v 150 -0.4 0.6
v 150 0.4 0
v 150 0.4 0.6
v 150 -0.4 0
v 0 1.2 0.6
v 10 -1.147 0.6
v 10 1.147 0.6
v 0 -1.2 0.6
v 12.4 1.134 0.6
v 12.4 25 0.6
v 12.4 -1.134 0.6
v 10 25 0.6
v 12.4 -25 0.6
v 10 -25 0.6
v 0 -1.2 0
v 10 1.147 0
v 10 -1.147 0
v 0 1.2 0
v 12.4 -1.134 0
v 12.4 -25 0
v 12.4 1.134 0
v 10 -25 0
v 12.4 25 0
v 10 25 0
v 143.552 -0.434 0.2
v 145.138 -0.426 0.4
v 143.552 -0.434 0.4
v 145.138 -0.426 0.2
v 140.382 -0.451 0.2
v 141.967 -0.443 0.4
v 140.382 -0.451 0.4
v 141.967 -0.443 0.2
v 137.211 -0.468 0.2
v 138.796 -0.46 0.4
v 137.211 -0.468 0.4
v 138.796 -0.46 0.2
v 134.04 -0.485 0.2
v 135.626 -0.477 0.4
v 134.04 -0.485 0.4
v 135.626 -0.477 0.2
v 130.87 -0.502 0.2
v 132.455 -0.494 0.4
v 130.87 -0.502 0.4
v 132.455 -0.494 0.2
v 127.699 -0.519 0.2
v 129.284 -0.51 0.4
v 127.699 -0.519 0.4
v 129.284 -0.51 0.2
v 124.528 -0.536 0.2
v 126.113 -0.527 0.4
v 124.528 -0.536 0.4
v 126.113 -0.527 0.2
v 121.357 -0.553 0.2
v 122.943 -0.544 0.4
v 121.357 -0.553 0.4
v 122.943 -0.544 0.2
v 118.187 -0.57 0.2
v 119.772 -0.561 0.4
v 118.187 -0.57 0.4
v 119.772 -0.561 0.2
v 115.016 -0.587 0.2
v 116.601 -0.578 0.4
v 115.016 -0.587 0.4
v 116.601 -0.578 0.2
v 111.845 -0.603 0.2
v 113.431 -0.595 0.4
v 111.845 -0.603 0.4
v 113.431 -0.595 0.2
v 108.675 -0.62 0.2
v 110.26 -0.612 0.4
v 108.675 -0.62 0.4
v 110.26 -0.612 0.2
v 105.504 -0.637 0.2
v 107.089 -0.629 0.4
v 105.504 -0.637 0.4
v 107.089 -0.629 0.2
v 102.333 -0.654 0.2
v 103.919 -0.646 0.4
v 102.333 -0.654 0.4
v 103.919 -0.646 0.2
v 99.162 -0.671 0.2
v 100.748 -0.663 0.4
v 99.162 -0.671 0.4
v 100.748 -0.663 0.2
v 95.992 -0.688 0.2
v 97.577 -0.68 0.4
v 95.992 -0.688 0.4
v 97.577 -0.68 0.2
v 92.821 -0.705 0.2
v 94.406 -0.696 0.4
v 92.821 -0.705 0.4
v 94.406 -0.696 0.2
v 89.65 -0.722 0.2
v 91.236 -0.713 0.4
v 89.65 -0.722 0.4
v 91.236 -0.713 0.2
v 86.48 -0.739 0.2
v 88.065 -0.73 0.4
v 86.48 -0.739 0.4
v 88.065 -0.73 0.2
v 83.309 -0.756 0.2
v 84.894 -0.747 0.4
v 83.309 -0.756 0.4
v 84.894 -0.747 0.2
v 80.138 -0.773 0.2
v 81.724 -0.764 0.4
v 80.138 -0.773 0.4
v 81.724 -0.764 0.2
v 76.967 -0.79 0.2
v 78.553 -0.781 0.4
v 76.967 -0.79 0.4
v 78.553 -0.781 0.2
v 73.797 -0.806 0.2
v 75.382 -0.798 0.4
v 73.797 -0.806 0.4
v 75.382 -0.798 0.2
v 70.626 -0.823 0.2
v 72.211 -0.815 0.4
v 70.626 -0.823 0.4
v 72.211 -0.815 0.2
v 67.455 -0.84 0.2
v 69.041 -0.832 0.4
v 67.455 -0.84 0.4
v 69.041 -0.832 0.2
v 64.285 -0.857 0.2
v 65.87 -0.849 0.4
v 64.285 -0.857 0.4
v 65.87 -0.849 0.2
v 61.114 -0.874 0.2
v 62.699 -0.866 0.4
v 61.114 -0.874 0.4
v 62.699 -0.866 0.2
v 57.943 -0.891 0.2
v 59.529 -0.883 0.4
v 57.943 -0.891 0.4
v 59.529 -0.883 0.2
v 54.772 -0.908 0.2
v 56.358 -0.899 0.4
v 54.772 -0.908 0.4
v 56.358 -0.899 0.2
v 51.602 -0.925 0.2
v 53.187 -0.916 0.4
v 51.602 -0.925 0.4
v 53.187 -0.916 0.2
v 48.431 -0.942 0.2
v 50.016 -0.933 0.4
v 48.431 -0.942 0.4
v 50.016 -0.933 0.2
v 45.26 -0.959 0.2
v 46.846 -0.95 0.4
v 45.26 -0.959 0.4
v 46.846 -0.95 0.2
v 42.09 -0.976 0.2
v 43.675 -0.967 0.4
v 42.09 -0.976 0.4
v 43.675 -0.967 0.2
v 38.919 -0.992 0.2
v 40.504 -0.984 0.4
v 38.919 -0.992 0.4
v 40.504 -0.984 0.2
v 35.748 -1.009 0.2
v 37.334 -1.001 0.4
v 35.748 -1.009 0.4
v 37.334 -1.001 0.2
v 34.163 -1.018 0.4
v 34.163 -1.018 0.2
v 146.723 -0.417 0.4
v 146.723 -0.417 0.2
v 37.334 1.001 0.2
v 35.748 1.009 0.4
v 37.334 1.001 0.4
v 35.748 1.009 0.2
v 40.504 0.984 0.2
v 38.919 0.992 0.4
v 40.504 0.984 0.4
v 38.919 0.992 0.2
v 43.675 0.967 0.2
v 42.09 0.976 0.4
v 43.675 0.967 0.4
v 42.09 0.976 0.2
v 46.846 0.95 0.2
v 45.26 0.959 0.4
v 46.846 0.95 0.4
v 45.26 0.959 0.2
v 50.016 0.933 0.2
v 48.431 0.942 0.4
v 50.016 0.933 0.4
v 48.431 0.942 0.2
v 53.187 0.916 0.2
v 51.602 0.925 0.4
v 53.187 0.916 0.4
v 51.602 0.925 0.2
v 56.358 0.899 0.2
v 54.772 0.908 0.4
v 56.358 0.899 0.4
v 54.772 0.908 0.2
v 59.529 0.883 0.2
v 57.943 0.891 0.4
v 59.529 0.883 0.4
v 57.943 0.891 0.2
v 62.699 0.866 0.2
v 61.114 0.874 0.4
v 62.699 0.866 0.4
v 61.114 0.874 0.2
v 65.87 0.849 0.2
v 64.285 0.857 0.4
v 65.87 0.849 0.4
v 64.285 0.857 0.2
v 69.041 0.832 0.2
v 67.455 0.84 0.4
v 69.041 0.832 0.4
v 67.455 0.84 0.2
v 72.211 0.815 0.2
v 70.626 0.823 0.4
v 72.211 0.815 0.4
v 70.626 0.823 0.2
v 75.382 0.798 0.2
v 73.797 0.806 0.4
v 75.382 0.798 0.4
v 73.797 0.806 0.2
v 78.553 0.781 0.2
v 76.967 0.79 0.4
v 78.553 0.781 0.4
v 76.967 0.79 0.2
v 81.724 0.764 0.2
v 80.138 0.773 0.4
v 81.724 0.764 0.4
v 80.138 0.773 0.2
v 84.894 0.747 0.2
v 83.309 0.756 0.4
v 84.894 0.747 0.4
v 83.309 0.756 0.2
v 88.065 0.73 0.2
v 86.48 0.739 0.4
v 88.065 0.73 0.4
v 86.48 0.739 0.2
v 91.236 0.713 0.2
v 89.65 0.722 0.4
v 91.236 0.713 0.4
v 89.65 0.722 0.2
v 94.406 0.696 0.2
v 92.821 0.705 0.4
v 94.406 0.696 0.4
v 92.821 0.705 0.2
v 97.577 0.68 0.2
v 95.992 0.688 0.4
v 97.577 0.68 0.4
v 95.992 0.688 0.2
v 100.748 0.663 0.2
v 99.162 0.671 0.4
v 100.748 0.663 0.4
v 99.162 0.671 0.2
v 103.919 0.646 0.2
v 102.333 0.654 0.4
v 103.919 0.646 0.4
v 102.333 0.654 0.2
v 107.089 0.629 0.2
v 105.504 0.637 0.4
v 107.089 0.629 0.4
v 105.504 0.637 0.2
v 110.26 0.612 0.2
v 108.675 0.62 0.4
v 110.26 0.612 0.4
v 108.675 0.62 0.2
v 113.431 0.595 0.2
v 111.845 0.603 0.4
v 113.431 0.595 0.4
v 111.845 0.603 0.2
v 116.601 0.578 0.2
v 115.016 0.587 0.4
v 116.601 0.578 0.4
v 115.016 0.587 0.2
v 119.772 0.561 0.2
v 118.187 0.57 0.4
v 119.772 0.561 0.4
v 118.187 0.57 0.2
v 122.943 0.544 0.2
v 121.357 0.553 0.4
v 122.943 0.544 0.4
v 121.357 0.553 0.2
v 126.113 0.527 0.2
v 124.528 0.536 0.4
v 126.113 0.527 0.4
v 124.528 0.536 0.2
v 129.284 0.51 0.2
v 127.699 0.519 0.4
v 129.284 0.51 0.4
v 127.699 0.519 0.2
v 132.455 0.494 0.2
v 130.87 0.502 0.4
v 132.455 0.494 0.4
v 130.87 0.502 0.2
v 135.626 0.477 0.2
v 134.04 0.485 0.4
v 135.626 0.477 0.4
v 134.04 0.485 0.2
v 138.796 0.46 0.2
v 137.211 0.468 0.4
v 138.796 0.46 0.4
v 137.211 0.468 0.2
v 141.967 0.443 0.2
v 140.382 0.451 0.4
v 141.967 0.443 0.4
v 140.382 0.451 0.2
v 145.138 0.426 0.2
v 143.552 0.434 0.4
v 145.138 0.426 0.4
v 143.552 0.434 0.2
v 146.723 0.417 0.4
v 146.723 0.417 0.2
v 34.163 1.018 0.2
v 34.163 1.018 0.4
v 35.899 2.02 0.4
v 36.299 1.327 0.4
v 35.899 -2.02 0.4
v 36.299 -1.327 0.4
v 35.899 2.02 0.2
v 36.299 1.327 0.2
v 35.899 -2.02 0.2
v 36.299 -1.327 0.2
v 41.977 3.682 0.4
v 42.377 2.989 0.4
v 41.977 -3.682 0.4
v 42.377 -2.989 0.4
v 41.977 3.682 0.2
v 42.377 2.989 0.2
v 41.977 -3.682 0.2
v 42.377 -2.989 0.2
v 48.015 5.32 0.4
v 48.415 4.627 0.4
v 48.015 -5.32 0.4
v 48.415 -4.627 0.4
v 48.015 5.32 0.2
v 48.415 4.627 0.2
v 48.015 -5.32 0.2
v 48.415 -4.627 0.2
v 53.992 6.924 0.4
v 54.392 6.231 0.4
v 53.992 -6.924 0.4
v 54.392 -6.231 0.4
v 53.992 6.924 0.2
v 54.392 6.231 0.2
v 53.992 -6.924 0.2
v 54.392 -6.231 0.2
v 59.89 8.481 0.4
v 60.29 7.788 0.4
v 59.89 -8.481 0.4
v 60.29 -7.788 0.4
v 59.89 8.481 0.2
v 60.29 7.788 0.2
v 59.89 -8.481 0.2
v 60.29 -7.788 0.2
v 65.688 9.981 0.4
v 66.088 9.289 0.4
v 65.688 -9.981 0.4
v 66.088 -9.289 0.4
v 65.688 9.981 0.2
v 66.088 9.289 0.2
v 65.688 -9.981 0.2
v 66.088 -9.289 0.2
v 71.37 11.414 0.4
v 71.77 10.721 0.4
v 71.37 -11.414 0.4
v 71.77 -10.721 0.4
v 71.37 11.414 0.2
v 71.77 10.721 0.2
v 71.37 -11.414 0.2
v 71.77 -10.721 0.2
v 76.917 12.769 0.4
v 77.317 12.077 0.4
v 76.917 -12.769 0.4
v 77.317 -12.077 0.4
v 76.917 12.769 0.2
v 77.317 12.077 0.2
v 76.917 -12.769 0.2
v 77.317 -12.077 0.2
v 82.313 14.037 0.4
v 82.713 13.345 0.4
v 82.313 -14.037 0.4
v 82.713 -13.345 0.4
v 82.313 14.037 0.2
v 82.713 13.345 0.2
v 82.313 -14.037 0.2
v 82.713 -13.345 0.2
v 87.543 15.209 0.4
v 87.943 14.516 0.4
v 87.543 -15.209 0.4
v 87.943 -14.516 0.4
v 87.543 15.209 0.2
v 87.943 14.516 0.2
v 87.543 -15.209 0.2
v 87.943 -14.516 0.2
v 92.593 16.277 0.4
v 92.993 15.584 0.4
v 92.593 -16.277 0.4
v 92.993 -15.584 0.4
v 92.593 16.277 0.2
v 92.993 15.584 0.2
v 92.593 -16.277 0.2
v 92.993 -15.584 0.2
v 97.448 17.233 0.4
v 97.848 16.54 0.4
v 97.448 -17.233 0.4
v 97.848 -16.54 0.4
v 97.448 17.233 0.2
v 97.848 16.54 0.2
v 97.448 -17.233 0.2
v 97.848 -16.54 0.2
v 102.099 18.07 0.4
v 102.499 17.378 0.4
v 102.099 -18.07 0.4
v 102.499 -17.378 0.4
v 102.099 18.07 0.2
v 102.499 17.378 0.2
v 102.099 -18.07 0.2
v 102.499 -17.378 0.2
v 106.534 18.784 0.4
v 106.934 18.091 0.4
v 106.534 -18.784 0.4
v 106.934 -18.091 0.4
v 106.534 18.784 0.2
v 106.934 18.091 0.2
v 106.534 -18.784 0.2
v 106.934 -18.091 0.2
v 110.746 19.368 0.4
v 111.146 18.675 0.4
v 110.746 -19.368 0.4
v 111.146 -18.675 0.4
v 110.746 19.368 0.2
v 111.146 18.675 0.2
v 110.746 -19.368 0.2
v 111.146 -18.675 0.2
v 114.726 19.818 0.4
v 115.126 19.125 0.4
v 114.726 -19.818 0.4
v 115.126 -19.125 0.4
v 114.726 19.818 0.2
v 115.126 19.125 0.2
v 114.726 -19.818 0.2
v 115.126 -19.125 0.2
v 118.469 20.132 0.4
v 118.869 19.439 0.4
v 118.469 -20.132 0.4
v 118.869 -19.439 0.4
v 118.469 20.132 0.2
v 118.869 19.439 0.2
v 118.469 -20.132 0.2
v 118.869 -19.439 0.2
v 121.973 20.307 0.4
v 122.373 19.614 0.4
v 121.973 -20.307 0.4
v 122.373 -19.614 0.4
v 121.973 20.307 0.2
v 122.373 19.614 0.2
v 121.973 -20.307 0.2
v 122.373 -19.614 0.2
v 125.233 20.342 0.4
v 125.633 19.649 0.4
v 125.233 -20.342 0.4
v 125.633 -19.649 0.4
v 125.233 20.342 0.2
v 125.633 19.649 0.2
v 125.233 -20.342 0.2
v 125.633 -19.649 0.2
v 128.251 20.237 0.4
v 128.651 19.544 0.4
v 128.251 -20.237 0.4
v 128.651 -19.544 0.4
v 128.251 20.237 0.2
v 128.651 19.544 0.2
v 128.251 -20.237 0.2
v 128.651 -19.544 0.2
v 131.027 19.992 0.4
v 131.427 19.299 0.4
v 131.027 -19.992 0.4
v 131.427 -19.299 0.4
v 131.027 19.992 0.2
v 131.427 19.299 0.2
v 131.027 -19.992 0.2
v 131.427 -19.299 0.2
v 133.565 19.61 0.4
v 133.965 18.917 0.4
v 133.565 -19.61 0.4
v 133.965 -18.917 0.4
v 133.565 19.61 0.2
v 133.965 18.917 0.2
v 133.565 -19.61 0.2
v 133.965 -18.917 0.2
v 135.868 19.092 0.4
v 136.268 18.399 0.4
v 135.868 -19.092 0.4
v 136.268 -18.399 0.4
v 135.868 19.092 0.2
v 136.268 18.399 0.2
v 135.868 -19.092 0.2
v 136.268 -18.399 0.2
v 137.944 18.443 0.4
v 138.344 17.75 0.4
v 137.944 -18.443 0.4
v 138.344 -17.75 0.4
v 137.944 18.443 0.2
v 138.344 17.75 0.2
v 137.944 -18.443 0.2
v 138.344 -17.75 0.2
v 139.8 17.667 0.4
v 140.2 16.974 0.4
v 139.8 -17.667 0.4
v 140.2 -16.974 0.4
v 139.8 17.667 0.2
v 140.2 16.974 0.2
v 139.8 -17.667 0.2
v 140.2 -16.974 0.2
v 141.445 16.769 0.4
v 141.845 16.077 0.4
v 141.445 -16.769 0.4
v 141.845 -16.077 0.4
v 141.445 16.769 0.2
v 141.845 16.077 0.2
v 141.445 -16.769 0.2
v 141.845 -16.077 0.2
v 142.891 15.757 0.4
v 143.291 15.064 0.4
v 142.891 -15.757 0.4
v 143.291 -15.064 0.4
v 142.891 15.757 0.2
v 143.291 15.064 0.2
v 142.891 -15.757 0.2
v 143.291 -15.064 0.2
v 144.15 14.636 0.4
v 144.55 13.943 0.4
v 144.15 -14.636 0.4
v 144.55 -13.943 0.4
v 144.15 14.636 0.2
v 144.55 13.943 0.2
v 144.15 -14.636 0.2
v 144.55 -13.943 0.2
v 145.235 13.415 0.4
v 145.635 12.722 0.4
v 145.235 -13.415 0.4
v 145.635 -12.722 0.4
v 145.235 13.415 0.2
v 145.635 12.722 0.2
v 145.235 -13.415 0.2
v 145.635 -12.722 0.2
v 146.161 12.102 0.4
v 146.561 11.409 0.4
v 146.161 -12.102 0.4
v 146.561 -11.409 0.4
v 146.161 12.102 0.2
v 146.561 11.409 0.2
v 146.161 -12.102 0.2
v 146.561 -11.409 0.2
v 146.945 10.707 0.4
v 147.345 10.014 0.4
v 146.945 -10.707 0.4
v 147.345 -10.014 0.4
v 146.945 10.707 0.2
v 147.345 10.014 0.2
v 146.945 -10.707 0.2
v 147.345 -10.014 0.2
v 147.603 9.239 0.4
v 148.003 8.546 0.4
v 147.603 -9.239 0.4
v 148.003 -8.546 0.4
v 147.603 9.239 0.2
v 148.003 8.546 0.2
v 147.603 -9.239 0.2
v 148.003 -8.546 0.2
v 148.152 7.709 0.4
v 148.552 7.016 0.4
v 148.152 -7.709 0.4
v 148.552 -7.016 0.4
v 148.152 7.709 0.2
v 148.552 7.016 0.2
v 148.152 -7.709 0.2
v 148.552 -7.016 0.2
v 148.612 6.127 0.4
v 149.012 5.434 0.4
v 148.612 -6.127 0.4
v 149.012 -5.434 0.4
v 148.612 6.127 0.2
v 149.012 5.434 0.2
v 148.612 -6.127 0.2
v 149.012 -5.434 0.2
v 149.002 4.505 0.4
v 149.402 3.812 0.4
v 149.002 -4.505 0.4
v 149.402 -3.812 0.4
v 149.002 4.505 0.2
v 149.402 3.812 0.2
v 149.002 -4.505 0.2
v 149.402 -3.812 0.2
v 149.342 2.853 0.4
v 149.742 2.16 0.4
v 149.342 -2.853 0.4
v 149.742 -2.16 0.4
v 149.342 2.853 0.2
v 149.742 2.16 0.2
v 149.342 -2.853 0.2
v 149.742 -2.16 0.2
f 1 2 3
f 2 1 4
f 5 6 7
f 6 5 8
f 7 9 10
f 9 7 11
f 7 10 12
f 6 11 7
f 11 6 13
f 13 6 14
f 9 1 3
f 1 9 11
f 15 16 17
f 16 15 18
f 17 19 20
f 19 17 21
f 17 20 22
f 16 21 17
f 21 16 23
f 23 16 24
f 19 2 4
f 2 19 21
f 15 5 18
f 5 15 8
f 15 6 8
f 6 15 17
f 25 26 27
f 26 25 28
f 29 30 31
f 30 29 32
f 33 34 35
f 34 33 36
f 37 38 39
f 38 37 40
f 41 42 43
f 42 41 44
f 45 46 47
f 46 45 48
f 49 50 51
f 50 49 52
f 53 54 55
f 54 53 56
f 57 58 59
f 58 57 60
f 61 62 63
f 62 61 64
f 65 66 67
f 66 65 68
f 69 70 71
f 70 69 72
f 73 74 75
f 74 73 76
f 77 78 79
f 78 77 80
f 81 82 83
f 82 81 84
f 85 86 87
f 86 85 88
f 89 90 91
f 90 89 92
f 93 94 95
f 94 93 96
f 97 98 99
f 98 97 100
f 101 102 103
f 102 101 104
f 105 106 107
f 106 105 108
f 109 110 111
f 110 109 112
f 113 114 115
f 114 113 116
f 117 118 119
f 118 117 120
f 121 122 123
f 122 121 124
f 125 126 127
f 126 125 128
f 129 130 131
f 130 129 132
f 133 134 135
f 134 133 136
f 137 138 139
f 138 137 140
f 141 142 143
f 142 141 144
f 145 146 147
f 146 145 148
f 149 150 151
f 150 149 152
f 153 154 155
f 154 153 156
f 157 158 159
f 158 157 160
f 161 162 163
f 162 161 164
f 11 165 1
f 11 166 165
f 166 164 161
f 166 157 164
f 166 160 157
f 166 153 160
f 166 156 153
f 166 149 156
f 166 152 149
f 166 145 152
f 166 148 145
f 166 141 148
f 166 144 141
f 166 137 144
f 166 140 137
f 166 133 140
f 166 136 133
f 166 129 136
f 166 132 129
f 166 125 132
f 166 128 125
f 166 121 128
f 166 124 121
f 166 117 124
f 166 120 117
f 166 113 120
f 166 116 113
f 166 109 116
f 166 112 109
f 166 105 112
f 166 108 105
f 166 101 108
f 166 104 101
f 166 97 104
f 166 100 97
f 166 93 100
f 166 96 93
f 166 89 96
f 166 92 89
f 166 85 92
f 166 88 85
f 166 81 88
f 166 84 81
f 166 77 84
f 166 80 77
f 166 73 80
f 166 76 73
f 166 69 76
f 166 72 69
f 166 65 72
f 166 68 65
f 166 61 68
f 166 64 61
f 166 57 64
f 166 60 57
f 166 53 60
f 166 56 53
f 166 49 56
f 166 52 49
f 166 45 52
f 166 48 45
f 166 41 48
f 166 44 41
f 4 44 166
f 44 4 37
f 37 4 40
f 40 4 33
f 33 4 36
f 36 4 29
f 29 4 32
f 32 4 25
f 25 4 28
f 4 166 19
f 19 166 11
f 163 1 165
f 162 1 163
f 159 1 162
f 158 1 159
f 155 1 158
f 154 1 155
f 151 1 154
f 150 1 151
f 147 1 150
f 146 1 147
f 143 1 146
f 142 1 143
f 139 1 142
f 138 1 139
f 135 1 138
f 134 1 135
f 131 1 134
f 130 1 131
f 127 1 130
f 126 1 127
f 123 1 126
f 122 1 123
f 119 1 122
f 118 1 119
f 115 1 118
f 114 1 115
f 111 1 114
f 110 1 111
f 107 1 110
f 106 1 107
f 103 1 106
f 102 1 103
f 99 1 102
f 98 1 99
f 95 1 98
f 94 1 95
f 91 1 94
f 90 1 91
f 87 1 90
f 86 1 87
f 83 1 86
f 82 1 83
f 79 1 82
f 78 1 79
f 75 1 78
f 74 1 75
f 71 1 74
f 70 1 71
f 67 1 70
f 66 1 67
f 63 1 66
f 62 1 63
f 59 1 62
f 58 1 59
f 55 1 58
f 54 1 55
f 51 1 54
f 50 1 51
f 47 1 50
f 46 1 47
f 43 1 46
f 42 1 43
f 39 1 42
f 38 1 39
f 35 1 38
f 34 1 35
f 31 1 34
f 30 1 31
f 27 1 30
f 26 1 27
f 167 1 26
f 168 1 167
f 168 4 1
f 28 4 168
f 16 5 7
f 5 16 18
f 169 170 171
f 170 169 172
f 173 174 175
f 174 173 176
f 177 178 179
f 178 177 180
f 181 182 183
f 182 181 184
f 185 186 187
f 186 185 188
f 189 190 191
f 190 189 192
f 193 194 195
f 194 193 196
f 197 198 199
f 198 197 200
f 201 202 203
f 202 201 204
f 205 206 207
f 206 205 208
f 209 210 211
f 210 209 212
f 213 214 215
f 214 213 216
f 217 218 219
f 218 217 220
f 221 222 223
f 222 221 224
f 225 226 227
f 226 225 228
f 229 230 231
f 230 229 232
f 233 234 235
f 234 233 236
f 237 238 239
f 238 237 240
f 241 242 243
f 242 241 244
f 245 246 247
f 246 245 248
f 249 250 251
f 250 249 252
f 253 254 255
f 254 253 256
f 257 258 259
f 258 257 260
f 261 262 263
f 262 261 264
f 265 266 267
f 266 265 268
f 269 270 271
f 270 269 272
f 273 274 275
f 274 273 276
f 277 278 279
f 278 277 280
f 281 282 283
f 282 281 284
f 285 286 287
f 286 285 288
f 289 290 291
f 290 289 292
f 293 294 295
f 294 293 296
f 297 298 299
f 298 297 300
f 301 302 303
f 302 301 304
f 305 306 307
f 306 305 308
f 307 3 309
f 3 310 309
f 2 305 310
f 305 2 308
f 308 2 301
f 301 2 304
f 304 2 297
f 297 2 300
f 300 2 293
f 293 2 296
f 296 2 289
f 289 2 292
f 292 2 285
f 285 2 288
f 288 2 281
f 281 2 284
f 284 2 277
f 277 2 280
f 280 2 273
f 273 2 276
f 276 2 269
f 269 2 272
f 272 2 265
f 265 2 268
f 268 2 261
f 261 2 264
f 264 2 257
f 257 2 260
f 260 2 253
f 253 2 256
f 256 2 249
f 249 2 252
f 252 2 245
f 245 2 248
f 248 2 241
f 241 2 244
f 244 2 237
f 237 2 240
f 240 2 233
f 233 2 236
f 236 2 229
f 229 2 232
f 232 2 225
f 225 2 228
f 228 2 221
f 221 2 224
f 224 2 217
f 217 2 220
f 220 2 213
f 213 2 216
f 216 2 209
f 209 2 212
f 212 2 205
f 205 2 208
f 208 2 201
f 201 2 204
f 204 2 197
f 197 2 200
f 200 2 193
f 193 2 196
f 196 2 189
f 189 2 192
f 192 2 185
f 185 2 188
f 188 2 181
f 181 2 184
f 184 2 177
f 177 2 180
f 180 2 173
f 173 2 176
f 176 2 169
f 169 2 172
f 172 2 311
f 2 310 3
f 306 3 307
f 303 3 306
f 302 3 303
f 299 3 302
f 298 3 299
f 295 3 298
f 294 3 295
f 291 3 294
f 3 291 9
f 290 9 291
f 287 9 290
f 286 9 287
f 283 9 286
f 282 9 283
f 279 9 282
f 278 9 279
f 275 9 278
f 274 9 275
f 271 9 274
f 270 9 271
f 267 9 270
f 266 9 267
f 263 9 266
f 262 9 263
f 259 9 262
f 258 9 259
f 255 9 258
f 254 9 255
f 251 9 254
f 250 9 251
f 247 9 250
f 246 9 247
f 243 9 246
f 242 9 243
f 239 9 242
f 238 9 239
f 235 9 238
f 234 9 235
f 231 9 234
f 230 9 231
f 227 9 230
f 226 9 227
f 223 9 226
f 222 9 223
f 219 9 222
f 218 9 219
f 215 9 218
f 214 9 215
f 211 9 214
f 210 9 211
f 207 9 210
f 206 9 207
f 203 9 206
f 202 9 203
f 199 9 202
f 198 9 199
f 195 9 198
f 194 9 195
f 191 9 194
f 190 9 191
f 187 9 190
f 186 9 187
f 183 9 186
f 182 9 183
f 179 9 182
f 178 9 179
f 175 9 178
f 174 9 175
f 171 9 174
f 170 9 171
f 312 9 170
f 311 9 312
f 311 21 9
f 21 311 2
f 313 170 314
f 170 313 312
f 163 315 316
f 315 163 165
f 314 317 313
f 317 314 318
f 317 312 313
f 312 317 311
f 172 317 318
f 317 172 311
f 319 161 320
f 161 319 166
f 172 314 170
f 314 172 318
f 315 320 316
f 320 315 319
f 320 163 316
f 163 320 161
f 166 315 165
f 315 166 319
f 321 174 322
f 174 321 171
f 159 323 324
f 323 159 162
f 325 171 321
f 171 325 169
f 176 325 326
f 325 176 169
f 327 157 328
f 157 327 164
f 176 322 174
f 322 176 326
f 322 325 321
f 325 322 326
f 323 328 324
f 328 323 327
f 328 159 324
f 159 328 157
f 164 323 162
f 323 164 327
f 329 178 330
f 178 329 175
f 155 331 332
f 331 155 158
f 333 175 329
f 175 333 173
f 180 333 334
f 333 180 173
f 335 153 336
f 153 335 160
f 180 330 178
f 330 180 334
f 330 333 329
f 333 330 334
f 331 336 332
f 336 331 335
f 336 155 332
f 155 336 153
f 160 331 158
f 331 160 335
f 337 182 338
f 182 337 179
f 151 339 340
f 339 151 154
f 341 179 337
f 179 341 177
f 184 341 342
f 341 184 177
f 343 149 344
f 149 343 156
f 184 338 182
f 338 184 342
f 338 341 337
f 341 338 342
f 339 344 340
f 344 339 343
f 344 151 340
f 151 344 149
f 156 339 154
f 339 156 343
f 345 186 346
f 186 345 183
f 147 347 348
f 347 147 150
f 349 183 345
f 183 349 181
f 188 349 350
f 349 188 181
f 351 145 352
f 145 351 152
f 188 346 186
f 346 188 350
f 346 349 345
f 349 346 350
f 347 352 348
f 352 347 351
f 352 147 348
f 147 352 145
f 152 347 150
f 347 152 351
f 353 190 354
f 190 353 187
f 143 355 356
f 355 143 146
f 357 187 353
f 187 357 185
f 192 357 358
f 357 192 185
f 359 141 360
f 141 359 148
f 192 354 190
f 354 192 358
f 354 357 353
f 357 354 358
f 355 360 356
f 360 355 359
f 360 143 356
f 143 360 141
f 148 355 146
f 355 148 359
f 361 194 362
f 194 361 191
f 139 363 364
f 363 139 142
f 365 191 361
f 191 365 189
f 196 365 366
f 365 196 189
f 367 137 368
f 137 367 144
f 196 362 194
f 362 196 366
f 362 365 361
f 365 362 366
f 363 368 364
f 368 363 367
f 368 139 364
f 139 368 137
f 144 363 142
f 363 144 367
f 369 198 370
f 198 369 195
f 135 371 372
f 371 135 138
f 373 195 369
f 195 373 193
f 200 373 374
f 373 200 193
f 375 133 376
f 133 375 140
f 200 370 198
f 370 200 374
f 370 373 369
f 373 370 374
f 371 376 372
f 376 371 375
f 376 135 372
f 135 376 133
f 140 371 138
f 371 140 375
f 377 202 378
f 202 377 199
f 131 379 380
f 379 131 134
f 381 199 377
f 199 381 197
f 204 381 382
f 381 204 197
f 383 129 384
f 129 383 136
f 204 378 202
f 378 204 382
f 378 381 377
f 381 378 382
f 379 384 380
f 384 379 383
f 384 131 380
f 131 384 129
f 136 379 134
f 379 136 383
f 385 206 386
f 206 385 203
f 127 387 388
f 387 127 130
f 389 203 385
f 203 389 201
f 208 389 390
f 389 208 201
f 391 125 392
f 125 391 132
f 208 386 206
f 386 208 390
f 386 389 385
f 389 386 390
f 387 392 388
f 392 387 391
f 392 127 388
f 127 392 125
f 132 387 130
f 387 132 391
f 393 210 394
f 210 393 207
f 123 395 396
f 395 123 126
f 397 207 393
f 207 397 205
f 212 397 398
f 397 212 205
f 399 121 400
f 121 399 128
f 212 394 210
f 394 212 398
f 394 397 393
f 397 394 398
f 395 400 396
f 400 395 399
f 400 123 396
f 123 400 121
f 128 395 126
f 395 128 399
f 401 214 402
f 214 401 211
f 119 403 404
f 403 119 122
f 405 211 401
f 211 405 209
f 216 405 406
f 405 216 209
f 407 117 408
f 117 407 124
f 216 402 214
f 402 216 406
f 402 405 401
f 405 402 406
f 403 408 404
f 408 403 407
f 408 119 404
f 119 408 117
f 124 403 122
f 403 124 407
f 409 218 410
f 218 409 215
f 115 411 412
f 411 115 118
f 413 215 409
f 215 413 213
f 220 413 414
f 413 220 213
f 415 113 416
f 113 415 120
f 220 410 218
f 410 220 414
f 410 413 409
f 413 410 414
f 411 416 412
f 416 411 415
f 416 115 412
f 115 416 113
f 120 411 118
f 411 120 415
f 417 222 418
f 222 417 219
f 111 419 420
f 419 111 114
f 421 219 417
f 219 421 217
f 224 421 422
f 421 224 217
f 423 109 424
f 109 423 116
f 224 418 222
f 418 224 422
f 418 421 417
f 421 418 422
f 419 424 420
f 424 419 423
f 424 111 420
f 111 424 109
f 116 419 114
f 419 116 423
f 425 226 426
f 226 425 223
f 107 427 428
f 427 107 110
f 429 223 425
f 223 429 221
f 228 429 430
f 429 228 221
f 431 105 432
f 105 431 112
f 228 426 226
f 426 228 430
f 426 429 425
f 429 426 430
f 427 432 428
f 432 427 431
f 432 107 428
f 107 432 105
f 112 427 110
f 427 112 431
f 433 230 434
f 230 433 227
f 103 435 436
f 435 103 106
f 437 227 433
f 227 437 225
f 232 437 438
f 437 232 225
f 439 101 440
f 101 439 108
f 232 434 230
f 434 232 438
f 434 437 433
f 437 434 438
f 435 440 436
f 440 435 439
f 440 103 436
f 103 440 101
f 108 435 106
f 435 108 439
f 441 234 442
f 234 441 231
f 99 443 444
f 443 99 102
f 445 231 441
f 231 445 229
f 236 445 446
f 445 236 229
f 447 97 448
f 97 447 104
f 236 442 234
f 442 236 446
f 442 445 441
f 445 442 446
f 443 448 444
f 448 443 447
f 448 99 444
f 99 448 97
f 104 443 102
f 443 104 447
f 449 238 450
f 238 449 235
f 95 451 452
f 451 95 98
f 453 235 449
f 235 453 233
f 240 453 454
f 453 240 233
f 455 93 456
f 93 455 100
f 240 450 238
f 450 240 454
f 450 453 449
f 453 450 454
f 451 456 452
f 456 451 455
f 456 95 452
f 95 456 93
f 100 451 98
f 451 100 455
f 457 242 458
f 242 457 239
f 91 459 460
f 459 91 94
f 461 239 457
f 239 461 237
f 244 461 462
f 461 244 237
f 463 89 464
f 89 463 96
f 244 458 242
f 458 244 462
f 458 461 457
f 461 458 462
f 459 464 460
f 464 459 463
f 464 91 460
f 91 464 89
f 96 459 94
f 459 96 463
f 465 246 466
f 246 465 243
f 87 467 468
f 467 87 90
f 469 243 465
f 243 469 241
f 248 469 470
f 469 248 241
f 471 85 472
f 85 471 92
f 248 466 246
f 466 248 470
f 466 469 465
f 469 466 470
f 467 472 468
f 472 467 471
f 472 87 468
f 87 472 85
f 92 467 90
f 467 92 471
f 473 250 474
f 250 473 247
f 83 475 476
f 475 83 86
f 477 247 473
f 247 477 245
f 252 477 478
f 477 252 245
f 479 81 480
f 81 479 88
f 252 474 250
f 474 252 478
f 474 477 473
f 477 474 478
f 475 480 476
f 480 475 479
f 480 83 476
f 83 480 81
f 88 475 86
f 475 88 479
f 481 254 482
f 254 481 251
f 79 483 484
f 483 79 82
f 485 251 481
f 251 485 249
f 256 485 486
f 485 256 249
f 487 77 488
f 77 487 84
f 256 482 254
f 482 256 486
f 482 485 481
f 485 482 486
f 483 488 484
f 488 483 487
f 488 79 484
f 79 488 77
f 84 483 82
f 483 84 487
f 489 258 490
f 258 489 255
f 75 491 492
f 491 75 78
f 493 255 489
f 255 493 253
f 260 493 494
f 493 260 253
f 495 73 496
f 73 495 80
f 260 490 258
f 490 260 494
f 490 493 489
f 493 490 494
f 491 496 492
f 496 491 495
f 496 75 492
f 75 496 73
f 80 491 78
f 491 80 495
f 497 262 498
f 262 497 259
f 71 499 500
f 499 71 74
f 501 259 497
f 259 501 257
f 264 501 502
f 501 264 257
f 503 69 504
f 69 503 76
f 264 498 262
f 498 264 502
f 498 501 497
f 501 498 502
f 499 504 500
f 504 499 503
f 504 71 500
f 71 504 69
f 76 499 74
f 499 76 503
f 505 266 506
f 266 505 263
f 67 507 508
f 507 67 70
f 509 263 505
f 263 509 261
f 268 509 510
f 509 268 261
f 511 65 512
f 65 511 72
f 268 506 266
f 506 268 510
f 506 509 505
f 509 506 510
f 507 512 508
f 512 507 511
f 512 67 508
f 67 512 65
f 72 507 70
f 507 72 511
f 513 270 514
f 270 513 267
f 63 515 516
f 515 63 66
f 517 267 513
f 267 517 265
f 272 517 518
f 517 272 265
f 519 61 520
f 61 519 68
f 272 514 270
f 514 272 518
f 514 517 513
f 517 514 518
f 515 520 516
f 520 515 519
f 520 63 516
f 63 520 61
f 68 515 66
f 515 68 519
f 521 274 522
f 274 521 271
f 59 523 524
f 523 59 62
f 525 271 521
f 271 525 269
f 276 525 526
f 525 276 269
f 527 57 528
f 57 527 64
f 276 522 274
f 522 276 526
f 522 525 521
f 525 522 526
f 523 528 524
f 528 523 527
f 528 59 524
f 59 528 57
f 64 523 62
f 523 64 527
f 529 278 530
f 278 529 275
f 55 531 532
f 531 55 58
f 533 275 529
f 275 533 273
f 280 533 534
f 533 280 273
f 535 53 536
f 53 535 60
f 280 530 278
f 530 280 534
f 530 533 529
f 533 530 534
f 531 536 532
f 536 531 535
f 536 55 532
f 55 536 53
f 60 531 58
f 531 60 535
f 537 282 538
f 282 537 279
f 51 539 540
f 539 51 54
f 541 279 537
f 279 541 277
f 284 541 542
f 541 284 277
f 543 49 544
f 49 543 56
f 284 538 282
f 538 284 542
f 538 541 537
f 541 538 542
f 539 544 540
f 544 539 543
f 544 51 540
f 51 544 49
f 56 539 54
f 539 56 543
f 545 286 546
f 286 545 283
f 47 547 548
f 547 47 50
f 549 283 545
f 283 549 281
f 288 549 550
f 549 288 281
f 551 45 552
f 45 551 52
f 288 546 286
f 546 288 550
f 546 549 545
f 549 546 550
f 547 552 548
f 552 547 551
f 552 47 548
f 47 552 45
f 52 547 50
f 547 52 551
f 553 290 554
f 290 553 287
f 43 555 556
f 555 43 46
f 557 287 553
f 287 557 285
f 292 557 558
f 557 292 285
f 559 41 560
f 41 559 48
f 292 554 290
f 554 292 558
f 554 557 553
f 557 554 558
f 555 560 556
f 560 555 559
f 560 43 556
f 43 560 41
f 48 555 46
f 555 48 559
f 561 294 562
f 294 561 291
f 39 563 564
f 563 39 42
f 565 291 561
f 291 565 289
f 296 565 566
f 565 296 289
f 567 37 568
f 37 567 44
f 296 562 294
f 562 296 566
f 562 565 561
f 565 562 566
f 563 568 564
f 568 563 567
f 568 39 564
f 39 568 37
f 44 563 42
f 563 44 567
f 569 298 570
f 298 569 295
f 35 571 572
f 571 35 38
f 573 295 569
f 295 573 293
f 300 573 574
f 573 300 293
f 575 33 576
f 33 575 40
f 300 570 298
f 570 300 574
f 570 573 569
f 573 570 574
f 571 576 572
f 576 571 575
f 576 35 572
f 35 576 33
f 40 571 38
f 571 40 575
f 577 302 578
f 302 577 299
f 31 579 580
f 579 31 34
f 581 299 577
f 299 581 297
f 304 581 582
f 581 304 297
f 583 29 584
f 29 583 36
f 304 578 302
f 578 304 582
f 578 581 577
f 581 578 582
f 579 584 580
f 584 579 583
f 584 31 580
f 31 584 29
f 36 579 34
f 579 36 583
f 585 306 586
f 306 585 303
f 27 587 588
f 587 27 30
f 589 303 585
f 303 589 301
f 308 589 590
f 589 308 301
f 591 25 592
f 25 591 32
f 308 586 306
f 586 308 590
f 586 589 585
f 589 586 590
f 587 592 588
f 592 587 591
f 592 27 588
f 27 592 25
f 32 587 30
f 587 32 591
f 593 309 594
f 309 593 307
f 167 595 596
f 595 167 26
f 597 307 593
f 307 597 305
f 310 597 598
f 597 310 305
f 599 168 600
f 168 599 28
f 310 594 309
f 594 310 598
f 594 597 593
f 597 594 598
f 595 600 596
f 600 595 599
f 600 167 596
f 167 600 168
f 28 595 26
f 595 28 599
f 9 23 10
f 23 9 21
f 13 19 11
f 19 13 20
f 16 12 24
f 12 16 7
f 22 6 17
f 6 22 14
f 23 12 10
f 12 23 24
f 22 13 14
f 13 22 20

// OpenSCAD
E_NOZZLE = 0.4; // Extrusion width
E_LAYER = E_NOZZLE / 2; // Layer thickness


// Generate a box
// - Along +X
// - Contained in +Z, touches XY
// - Split in half (along) by XZ
module box(l, w, h) {
    translate([
        0,
        - w / 2,
        0,
    ])
        cube([
            l,
            w,
            h,
        ]);
}


// Factor for length of a barb where l = [0, 1]
// determines where the barb is along the vane
function barb_factor(l) = sin(l * 180);


// Generate a whole feather starting at 0, 0, 0 along +X
module feather() {

    // Length of a feather shaft
    shaft_l = 150;
    // Width of a feather shaft
    shaft_w = E_NOZZLE * 6;
    // Height of a feather shaft
    shaft_h = E_LAYER * 3;

    // Base length of a barb
    barb_l = 40;
    // Width of a barb
    barb_w = E_NOZZLE * 2;
    // Height of a barb
    barb_h = E_LAYER;
    
    // Angle for the barbs
    barb_a = 30;
    // Gap between the barbs
    barb_g = E_NOZZLE * 2;
    // How close together to put the barbs along +X
    barb_gx = (barb_g + barb_w) / sin(barb_a);

    // Vane as a fraction of shaft length
    vane_f = 0.8;
    // Vane length
    vane_l = vane_f * shaft_l;
    // Vane start offset
    vane_o = shaft_l - vane_l;
    
    shear = (shaft_w / shaft_l) / 3;
    m1 = [
        [1, 0, 0, 0],
        [shear, 1, 0, 0],
        [0, 0, 1, 0],
        [0, 0, 0, 1],
    ];
    m2 = [
        [1, 0, 0, 0],
        [-shear, 1, 0, 0],
        [0, 0, 1, 0],
        [0, 0, 0, 1],
    ];

    intersection() {
        multmatrix(m1)
            box(shaft_l, shaft_w, shaft_h);
        multmatrix(m2)
            box(shaft_l, shaft_w, shaft_h);
    }
    
    color("green") {
        for (x = [vane_o : barb_gx : shaft_l - barb_gx]) {
            translate([x, 0, (shaft_h - barb_h) / 2]) {
                let (l = (x - vane_o) / vane_l, f = barb_factor(l)) {
                    rotate([0, 0, barb_a])
                        box(barb_l * f, barb_w, barb_h);
                    rotate([0, 0, -barb_a])
                        box(barb_l * f, barb_w, barb_h);
                }
            }
        }
    }

    translate([10, -25, 0])
        cube([shaft_w, 50, shaft_h]);
}


feather();
